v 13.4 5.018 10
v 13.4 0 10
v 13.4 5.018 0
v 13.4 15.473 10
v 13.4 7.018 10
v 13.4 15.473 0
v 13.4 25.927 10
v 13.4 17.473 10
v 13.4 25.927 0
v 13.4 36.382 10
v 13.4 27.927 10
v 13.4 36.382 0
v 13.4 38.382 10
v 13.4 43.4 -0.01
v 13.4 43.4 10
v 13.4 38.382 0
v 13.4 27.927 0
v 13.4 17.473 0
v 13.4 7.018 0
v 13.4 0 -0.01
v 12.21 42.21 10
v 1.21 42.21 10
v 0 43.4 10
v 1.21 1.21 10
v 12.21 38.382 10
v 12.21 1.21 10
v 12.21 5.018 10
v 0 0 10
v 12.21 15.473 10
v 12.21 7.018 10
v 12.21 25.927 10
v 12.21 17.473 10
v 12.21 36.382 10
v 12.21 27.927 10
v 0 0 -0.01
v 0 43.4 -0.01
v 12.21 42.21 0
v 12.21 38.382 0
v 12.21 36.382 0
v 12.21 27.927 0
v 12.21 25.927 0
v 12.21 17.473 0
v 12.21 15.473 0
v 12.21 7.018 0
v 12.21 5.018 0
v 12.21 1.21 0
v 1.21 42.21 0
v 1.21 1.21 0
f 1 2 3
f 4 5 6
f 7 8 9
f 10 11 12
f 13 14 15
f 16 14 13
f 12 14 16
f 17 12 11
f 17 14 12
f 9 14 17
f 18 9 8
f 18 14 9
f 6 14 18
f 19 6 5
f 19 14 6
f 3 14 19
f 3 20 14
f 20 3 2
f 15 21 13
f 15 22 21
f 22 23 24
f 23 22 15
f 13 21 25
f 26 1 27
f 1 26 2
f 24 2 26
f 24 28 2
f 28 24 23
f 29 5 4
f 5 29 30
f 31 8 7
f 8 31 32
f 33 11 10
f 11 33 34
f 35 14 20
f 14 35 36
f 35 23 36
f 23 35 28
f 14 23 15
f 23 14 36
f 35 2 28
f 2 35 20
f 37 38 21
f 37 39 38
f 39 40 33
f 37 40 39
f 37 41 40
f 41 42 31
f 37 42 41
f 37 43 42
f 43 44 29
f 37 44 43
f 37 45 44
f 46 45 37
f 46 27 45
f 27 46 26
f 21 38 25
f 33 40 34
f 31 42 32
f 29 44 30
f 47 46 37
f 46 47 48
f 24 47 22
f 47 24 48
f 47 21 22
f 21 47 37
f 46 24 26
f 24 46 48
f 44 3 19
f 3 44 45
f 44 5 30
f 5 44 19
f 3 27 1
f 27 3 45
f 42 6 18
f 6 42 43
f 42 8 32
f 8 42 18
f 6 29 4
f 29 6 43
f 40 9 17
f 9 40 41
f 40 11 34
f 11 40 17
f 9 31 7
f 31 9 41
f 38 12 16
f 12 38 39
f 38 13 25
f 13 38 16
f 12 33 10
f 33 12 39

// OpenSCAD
// file: ../../Base/Rotation.scad
// Fischertechnik Box Foundation
// Geometry Helpers Rotation

include <PlacementOptions.scad>

// getRotatedSpace(space, rotation=NoRotation)
// Rotates the space dependent on the specified rotation

function getRotatedSpace(space, rotation=NoRotation) = [
    (rotation == Rotate90 || rotation == Rotate270) ? space.y : space.x,
    (rotation == Rotate90 || rotation == Rotate270) ? space.x : space.y
];

// Rotates the given space around the fixed left lower corner
// space = the space the children needs as width/depth list [width,depth]
// rotation = 0 Rotate0 degrees, 1 Rotate90 degrees, 2 Rotate180 degrees, 3 Rotate270 degrees (equivalent to -90)

module RotateFix(space, rotation=NoRotation) {
    dy = (rotation == Rotate0 || rotation == Rotate270) ? 0 :
        (rotation == Rotate90) ? space.x :
        space.y;
    dx = (rotation < Rotate180) ? 0 :
        (rotation == Rotate180) ? space.x :
        space.y;
    
    translate([dx, dy, 0])
        rotate([0, 0, rotations[rotation]])
            children();
}
// file: ../../Base/Alignment.scad
// Fischertechnik Box Foundation
// Geometry Helpers Alignment

include <PlacementOptions.scad>

// getAlignedX(elementWidth, spaceWidth, align=AlignRight, offset=0)
// Gets the aligned X offset of an element with the given
// width in the given space.
// elementWidth = The width of the element to positon
// spaceWidth = The space where the element should be aligned
// align = 0 AlignLeft, 1 AlignCenter, 2 AlignRight
// offset = an optional offset from the aligned position. When
// aligned left or centered, then positive values are in X direction.
// When aligned right then positive values are in negative X direction.

function getAlignedX(elementWidth, spaceWidth, align=AlignRight, offset=0) =
    (align == AlignLeft) ?
        offset :
        ((align == AlignCenter) ?
        (spaceWidth - elementWidth)/2 + offset :
        spaceWidth - offset - elementWidth);

// getAlignedY(elementDepth, spaceDepth, align=AlignTop, offset=0)
// Gets the aligned Y offset of an element with the given
// depth in the given space.
// elementDepth = The depth of the element to positon
// spaceDepth = The space where the element should be aligned
// align = 0 AlignBottom, 1 AlignCenter, 2 AlignTop
// offset = an optional offset from the aligned position. When
// aligned bottom or centered, then positive values are in Y direction.
// When aligned top then positive values are in negative Y direction.

function getAlignedY(elementDepth, spaceDepth, align=AlignTop, offset=0) =
    (align == AlignBottom) ?
        offset :
        ((align == AlignCenter) ?
        (spaceDepth - elementDepth)/2 + offset :
        spaceDepth - offset - elementDepth);
// file: ../../Base/PlacementOptions.scad
// Fischertechnik Box Foundation
// Placement Options

// Alignment
NoAlign = 0;
AlignLeft = 1;
AlignBottom = 2;
AlignCenter = 3;
AlignRight = 4;
AlignTop = 5;

// Element rotation degree steps
rotations = [0, -90, -180, -270];

// Rotation
NoRotation = 0;
Rotate0 = 0;
Rotate90 = 1;
Rotate180 = 2;
Rotate270 = 3;

// Docking (seen from above)
NoDock = -1;
DockLeft = 0;
DockTop = 1;
DockRight = 2;
DockCorner = 2;
DockBottom = 3;

// Web corners
LowerLeft = 0;
UpperLeft = 1;
UpperRight = 2;
LowerRight = 3;

// Web position relative to corner
LeftOfCorner = 0;
RightOfCorner = 1;

// Rails direction
Horizontal = true;
Vertical = false;
// file: ../../Base/Boxes.scad
// Fischertechnik Box Foundation
// Pre-designed Boxes

use <Constants.scad>

include <PlacementOptions.scad>

box190Width = 190;
box190Depth = 130;
box130Width = 130;
box130Depth = 95;

// Values are from an original ec3 box
topBottomDifference = 1.5;
outerHeight = 40;
baseThickness = 1.8;
innerHeight = outerHeight - baseThickness;
stackExcess = 5.7;
radius = 3.5;
wallThickness = 1.5;
tolerance = 0.2;

boxWallThickness = wallThickness;
boxBaseThickness = baseThickness;
boxWebWidth = 3.0;

// getBoxWallThickness()
// Gets the wall thickness of a Fischertechnik Box
function getBoxWallThickness() = boxWallThickness;

// getBoxUsageHeight(height = 38.2)
// Gets the usable height of a Fischertechnik box
// height = Outer height of the box from the bottom to the upper edge.
function getBoxUsageHeight(height = outerHeight) = height - baseThickness - stackExcess;

// getBoxInnerHeight()
// Gets the inner height of a Fischertechnik box, including the stack excess
function getBoxInnerHeight() = innerHeight;

// getBoxBaseThickness()
// Gets the thickness of the Fischertechnik box base.
function getBoxBaseThickness() = boxBaseThickness;

// getBoxWebWidth()
// Gets the width of a box web
function getBoxWebWidth() = boxWebWidth;

// getBox190Space()
// Gets the usable inner space of a Box 190 as an x/y-list
function getBox190Space() = [
    box190Width - 2*getBoxWallThickness() - topBottomDifference, 
    box190Depth - 2*getBoxWallThickness() - topBottomDifference ];

// RoundedCornerPlate(width, depth, height, radius)
// Creates a body plate with rounded corners for a box. Used
// also to create the complete box with the hull module.
// width = Width of the plate
// depth = depth of the plate 
// height = thickness of the plate
// radius = radius of the rounded corner
module RoundedCornerPlate(width, depth, height, radius) {
    translate([radius, radius])
    hull() {
        w = width-2*radius;
        d = depth-2*radius;
        cube([w, d, height]);
        cylinder(height, r=radius, $fn=getFragments());
        translate([w, 0])
            cylinder(height, r=radius, $fn=getFragments());
        translate([w, d])
            cylinder(height, r=radius, $fn=getFragments());
        translate([0, d])
            cylinder(height, r=radius, $fn=getFragments());
    }
}

// BoxBase(width, depth)
// Creates an empty stackable Fischertechnik compatible box
// width = Outer width of the box (190, 130, ...)
// depth = Outer depth of the box (130, 95, ...)

module BoxBase(width, depth, height=outerHeight) {    
    thinPlate = 0.01;

    innerHeight = height - baseThickness;    
    
    module Body(tolerance=tolerance) {
        hull() {
            // Bottom with tolerance to fit into the original boxes when stacked
            translate([-wallThickness+tolerance, -wallThickness+tolerance, -baseThickness])
                RoundedCornerPlate(width-topBottomDifference-2*tolerance, depth-topBottomDifference-2*tolerance, thinPlate, radius);
            
            // Top
            translate([-wallThickness-topBottomDifference/2, -wallThickness-topBottomDifference/2, innerHeight-thinPlate])
                RoundedCornerPlate(width, depth, thinPlate, radius);
         }
    }

    module Cutoff() {
        hull() {
            coWidth = width - 2*wallThickness;
            coDepth = depth - 2*wallThickness;
            
            // Bottom
            RoundedCornerPlate(coWidth-topBottomDifference, coDepth-topBottomDifference, thinPlate, radius);

            // Top
            translate([-topBottomDifference/2, -topBottomDifference/2, innerHeight+thinPlate]) 
                RoundedCornerPlate(coWidth, coDepth, thinPlate, radius);
        }
    }
    
    difference() {        
        Body();
        Cutoff();
        stackOffset = innerHeight - stackExcess;
        translate([0, 0, stackOffset + baseThickness])
            Body(tolerance=0);
    }
}

// Creates the Fischertechnik empty box 130x190 mm and places it at position 0,0
// 190x130 are the outer sizes, the inner space is slightly smaller. Use getBox190Space() to get the inner sizes.
// The box is positioned that the usable inner space is at the 0,0,0 position.

module Box190() {
    BoxBase(box190Width, box190Depth);
}

// Gets the usable inner space of a Box 130 as an x/y-list
function getBox130Space() = [
    box130Width - 2*getBoxWallThickness() - topBottomDifference, 
    box130Depth - 2*getBoxWallThickness() - topBottomDifference ];

// Creates the Fischertechnik empty box 95x130 mm and places it at position 0,0
// 190x130 are the outer sizes, the inner space is slightly smaller. Use getBox190Space() to get the inner sizes.
// The box is positioned that the usable inner space is at the 0,0,0 position.

module Box130() {
    BoxBase(box130Width, box130Depth);
}

// Creates a web at the specified box walls
// corner 0 = LowerLeft, 1 = UpperLeft, 2 = UpperRight, 3 = LowerRight
// side 0 = LeftOfCorner, 1 = RightOfCorner
// distance = Distance in mm from the corner
// boxSpace = inner width and depth of the box (default: Box 190)
// webWidth = length of the web (default is 3 mms)
// webThickness = thickness of the web (default is 1 mm)
// height = Height of the web (standard is getBoxUsageHeight())
// sink = How much of the web is sunk into the wall

module BoxWeb(
    corner, 
    side, 
    distance, 
    boxSpace=getBox190Space(), 
    webWidth=getBoxWebWidth(), 
    webThickness=1.0, 
    height=getBoxUsageHeight(),
    sink = getBoxWallThickness()/2) {
    width = (corner % 2 == 0) ? 
            (side == LeftOfCorner ? webWidth : webThickness) :
            (side == LeftOfCorner ? webThickness : webWidth);

    depth = (corner % 2 == 0) ? 
            (side == RightOfCorner ? webWidth : webThickness) :
            (side == RightOfCorner ? webThickness : webWidth);
    
    xDiff = corner == LowerLeft ? 
                (side == LeftOfCorner ? -sink : distance) :
            (corner == UpperLeft ?                
                (side == LeftOfCorner ? distance : -sink) :
            (corner == UpperRight ?
                (side == LeftOfCorner ? boxSpace.x-webWidth+sink : boxSpace.x-distance-webThickness) :
                (side == LeftOfCorner ? boxSpace.x-distance-webThickness: boxSpace.x-webWidth+sink)));

    yDiff = corner == LowerLeft ? 
                (side == RightOfCorner ? -sink : distance) :
            (corner == UpperLeft ?
                (side == RightOfCorner ? boxSpace.y-distance-webThickness : boxSpace.y-webWidth+sink) :
            (corner == UpperRight ?
                (side == RightOfCorner ? boxSpace.y-webWidth+sink : boxSpace.y-distance-webThickness) :
                (side == RightOfCorner ? distance : -sink)));
    
    translate([xDiff, yDiff, -getExcess()])
        cube([width, depth, height + 2*getExcess()]);
}
// file: ../../Base/Placement.scad
// Fischertechnik Box Foundation
// Geometry Helpers Placement

use <Constants.scad>
use <Alignment.scad>
use <Rotation.scad>
use <Boxes.scad>

include <PlacementOptions.scad>

// Place(x=0, y=0, elementSpace=[0,0], alignX=AlignLeft, alignY=AlignBottom, rotation=Rotate0, boxSpace=getBox190Space())
// Places the child at the specified position
// y = Y-Position. This is a relative position when an X aligment is specified.
// x = X-Position. This is a relative position when an Y aligment is specified.
// elementSpace = space of the element to be placed [x,y]
// alignX = -1=NoAlign, 0 AlignLeft, 1 AlignCenter, 3 AlignRight (elementSpace and boxSpace required!)
// alignY = -1=NoAlign, 2 AlignBottom, 1 AlignCenter, 4 AlignTop (elementSpace and boxSpace required!)
// rotation = 0 Rotate0 0 degrees, 1 Rotate90 90 degrees, 
// 2 Rotate180 180 degrees, 3 Rotate270 270 degrees (equivalent to -90)
// boxSpace = Inner space of the box where the placement occurs [x,y] - default is Box 190x130 inner space

module Place(x=0, y=0, elementSpace=[0,0], 
  alignX=AlignLeft, alignY=AlignBottom, 
  rotation=NoRotation, boxSpace=getBox190Space()) {

    module Position(x, y, space, rotation=Rotate0) {
        translate([x, y, 0])
            RotateFix(space, rotation)
                children();
    }

    space = getRotatedSpace(elementSpace, rotation);
    alignedX = getAlignedX(space.x, boxSpace.x, alignX, x);
    alignedY = getAlignedY(space.y, boxSpace.y, alignY, y);
    Position(alignedX, alignedY, elementSpace, rotation)
        children();
}

// Center(space=getBox130Space(), elementSpace=[0,0])
// space = Space where the children is centered. For cylinder use centered=true and no elementSpace.
// elementSpace = space of the element to be centered [x,y]

module Center(space=getBox190Space(), elementSpace=[0,0]) {
    Place(elementSpace=elementSpace, boxSpace=space, alignX=AlignCenter, alignY=AlignCenter)
        children();
}

// CenterHorizontal(width=0, y=0, offset=0, space=getBox130Space())
// width = Width of the element to be placed.
// y = Y position of the element
// offset = Offset from the center position (negative will be left of the center)
// space = Space where the element is placed

module CenterHorizontal(width=0, y=0, offset=0, space=getBox190Space()) {
    Place(x=offset, y=y, elementSpace=[width, 0], boxSpace=space, alignX=AlignCenter)
        children(0);
}

// CenterVertical(depth=0, x=0, offset=0, space=getBox130Space())
// depth = Depth of the element to be placed.
// x = X position of the element
// offset = Offset from the center position (negative will be down of the center)
// space = Space where the element is placed

module CenterVertical(depth=0, x=0, offset=0, space=getBox190Space()) {
    Place(x=x, y=offset, elementSpace=[0, depth], boxSpace=space, alignY=AlignCenter)
        children(0);
}

// getIsVertical(align)
// True if the specified alignment needs a vertical orientation for a divider (AlignRight, AlignLeft)

function getIsVertical(align) = (align == AlignRight || align == AlignLeft);

// getIsHorizontal(align)
// True if the specified alignment needs a horizontal orientation for a divider (AlignTop, AlignBottom)

function getIsHorizontal(align) = (align == AlignTop || align == AlignBottom);
// file: ../../Base/Constants.scad
// Fischertechnik Box Foundation
// Constants

// Constant values necessary for multiple elements

// Base constants
dividerThickness = 1.2;
excess = 0.01;
fragments = 90;
tolerance = 0.8;

// Gets the thickness of a divider 
function getDividerThickness() = dividerThickness;

// Gets the excess that is used to merge walls into each other
function getExcess() = excess;

// Gets amount of fragments of a cylinder
function getFragments() = fragments;

// Gets the inner tolerance of a frame to each side
function getTolerance() = tolerance;


// Fischertechnik specific constants
axisDiameter = 4;
axisBottomDiameter = axisDiameter + 1;
axisTolerance = 0.2;
axisLockingLength = 8;

// Gets axis diameter of Fischertechnik axis
function getAxisDiameter() = axisDiameter;

// Gets axis diameter tolerance (subtracted for element axis)
function getAxisTolerance() = axisTolerance;

// Gets the axis diameter for standing axis
function getStandAxisDiameter() = getAxisDiameter() - getAxisTolerance();

// Gets axis bottom diameter for thicker part at the bottom
function getAxisBottomDiameter() = axisBottomDiameter;

// Gets the lengthh of the locking part of a locking axis
function getAxisLockingLength() = axisLockingLength;

pinHeight = 2.5;
pinTolerance = 0.2;

// gets the height of a connecting pin
function getPinHeight() = pinHeight;

// gets the connecting pin height tolerance
function getPinTolerance() = pinTolerance;

standardEdgeDistance = 2.5;
standardWebDistance = 11.5;
standardCornerLength = 15;

// gets the standard distance to the wall of the box for dockable frames with webs
function getStandardEdgeDistance() = standardEdgeDistance;

// gets the standard distance of each web to the corner of the dockable frame
function getStandardWebDistance() = standardWebDistance;

// gets the standard length of the corner walls of a dockable frame
function getStandardCornerLength() = standardCornerLength;

tubeWallFactor = 0.8;

// gets the wall thickness of a tube.
function getTubeWallThickness() = tubeWallFactor * getDividerThickness();

smallPartsFrameHeight = 20;

// gets the frame height for docked small parts boxes.
function getSmallPartsFrameHeight() = smallPartsFrameHeight;

hubRingDiameter = 19.5;
hubRingLevelDiameter = 21;

// gets the diameter of a tube matching the inner ring of a wheel
function getHubRingDiameter() = hubRingDiameter;

// gets the diameter of a hub tube with a thicker diameter
function getHubRingLevelDiameter() = hubRingLevelDiameter;
// main file
// Fischertechnik Box Foundation
// ModelBase
// Test FrameRightCutoffs

use <../../Base/Constants.scad>
use <../../ModelBase/Simple.scad>

width = 10;
count = 4;
cutoffWidth = 2;
tolerance = 1;

difference() {
    volume = [10, width * count, 10];
    Frame(volume, tolerance);
    FrameRightCutoffs(volume, count, cutoffWidth, tolerance);
}
